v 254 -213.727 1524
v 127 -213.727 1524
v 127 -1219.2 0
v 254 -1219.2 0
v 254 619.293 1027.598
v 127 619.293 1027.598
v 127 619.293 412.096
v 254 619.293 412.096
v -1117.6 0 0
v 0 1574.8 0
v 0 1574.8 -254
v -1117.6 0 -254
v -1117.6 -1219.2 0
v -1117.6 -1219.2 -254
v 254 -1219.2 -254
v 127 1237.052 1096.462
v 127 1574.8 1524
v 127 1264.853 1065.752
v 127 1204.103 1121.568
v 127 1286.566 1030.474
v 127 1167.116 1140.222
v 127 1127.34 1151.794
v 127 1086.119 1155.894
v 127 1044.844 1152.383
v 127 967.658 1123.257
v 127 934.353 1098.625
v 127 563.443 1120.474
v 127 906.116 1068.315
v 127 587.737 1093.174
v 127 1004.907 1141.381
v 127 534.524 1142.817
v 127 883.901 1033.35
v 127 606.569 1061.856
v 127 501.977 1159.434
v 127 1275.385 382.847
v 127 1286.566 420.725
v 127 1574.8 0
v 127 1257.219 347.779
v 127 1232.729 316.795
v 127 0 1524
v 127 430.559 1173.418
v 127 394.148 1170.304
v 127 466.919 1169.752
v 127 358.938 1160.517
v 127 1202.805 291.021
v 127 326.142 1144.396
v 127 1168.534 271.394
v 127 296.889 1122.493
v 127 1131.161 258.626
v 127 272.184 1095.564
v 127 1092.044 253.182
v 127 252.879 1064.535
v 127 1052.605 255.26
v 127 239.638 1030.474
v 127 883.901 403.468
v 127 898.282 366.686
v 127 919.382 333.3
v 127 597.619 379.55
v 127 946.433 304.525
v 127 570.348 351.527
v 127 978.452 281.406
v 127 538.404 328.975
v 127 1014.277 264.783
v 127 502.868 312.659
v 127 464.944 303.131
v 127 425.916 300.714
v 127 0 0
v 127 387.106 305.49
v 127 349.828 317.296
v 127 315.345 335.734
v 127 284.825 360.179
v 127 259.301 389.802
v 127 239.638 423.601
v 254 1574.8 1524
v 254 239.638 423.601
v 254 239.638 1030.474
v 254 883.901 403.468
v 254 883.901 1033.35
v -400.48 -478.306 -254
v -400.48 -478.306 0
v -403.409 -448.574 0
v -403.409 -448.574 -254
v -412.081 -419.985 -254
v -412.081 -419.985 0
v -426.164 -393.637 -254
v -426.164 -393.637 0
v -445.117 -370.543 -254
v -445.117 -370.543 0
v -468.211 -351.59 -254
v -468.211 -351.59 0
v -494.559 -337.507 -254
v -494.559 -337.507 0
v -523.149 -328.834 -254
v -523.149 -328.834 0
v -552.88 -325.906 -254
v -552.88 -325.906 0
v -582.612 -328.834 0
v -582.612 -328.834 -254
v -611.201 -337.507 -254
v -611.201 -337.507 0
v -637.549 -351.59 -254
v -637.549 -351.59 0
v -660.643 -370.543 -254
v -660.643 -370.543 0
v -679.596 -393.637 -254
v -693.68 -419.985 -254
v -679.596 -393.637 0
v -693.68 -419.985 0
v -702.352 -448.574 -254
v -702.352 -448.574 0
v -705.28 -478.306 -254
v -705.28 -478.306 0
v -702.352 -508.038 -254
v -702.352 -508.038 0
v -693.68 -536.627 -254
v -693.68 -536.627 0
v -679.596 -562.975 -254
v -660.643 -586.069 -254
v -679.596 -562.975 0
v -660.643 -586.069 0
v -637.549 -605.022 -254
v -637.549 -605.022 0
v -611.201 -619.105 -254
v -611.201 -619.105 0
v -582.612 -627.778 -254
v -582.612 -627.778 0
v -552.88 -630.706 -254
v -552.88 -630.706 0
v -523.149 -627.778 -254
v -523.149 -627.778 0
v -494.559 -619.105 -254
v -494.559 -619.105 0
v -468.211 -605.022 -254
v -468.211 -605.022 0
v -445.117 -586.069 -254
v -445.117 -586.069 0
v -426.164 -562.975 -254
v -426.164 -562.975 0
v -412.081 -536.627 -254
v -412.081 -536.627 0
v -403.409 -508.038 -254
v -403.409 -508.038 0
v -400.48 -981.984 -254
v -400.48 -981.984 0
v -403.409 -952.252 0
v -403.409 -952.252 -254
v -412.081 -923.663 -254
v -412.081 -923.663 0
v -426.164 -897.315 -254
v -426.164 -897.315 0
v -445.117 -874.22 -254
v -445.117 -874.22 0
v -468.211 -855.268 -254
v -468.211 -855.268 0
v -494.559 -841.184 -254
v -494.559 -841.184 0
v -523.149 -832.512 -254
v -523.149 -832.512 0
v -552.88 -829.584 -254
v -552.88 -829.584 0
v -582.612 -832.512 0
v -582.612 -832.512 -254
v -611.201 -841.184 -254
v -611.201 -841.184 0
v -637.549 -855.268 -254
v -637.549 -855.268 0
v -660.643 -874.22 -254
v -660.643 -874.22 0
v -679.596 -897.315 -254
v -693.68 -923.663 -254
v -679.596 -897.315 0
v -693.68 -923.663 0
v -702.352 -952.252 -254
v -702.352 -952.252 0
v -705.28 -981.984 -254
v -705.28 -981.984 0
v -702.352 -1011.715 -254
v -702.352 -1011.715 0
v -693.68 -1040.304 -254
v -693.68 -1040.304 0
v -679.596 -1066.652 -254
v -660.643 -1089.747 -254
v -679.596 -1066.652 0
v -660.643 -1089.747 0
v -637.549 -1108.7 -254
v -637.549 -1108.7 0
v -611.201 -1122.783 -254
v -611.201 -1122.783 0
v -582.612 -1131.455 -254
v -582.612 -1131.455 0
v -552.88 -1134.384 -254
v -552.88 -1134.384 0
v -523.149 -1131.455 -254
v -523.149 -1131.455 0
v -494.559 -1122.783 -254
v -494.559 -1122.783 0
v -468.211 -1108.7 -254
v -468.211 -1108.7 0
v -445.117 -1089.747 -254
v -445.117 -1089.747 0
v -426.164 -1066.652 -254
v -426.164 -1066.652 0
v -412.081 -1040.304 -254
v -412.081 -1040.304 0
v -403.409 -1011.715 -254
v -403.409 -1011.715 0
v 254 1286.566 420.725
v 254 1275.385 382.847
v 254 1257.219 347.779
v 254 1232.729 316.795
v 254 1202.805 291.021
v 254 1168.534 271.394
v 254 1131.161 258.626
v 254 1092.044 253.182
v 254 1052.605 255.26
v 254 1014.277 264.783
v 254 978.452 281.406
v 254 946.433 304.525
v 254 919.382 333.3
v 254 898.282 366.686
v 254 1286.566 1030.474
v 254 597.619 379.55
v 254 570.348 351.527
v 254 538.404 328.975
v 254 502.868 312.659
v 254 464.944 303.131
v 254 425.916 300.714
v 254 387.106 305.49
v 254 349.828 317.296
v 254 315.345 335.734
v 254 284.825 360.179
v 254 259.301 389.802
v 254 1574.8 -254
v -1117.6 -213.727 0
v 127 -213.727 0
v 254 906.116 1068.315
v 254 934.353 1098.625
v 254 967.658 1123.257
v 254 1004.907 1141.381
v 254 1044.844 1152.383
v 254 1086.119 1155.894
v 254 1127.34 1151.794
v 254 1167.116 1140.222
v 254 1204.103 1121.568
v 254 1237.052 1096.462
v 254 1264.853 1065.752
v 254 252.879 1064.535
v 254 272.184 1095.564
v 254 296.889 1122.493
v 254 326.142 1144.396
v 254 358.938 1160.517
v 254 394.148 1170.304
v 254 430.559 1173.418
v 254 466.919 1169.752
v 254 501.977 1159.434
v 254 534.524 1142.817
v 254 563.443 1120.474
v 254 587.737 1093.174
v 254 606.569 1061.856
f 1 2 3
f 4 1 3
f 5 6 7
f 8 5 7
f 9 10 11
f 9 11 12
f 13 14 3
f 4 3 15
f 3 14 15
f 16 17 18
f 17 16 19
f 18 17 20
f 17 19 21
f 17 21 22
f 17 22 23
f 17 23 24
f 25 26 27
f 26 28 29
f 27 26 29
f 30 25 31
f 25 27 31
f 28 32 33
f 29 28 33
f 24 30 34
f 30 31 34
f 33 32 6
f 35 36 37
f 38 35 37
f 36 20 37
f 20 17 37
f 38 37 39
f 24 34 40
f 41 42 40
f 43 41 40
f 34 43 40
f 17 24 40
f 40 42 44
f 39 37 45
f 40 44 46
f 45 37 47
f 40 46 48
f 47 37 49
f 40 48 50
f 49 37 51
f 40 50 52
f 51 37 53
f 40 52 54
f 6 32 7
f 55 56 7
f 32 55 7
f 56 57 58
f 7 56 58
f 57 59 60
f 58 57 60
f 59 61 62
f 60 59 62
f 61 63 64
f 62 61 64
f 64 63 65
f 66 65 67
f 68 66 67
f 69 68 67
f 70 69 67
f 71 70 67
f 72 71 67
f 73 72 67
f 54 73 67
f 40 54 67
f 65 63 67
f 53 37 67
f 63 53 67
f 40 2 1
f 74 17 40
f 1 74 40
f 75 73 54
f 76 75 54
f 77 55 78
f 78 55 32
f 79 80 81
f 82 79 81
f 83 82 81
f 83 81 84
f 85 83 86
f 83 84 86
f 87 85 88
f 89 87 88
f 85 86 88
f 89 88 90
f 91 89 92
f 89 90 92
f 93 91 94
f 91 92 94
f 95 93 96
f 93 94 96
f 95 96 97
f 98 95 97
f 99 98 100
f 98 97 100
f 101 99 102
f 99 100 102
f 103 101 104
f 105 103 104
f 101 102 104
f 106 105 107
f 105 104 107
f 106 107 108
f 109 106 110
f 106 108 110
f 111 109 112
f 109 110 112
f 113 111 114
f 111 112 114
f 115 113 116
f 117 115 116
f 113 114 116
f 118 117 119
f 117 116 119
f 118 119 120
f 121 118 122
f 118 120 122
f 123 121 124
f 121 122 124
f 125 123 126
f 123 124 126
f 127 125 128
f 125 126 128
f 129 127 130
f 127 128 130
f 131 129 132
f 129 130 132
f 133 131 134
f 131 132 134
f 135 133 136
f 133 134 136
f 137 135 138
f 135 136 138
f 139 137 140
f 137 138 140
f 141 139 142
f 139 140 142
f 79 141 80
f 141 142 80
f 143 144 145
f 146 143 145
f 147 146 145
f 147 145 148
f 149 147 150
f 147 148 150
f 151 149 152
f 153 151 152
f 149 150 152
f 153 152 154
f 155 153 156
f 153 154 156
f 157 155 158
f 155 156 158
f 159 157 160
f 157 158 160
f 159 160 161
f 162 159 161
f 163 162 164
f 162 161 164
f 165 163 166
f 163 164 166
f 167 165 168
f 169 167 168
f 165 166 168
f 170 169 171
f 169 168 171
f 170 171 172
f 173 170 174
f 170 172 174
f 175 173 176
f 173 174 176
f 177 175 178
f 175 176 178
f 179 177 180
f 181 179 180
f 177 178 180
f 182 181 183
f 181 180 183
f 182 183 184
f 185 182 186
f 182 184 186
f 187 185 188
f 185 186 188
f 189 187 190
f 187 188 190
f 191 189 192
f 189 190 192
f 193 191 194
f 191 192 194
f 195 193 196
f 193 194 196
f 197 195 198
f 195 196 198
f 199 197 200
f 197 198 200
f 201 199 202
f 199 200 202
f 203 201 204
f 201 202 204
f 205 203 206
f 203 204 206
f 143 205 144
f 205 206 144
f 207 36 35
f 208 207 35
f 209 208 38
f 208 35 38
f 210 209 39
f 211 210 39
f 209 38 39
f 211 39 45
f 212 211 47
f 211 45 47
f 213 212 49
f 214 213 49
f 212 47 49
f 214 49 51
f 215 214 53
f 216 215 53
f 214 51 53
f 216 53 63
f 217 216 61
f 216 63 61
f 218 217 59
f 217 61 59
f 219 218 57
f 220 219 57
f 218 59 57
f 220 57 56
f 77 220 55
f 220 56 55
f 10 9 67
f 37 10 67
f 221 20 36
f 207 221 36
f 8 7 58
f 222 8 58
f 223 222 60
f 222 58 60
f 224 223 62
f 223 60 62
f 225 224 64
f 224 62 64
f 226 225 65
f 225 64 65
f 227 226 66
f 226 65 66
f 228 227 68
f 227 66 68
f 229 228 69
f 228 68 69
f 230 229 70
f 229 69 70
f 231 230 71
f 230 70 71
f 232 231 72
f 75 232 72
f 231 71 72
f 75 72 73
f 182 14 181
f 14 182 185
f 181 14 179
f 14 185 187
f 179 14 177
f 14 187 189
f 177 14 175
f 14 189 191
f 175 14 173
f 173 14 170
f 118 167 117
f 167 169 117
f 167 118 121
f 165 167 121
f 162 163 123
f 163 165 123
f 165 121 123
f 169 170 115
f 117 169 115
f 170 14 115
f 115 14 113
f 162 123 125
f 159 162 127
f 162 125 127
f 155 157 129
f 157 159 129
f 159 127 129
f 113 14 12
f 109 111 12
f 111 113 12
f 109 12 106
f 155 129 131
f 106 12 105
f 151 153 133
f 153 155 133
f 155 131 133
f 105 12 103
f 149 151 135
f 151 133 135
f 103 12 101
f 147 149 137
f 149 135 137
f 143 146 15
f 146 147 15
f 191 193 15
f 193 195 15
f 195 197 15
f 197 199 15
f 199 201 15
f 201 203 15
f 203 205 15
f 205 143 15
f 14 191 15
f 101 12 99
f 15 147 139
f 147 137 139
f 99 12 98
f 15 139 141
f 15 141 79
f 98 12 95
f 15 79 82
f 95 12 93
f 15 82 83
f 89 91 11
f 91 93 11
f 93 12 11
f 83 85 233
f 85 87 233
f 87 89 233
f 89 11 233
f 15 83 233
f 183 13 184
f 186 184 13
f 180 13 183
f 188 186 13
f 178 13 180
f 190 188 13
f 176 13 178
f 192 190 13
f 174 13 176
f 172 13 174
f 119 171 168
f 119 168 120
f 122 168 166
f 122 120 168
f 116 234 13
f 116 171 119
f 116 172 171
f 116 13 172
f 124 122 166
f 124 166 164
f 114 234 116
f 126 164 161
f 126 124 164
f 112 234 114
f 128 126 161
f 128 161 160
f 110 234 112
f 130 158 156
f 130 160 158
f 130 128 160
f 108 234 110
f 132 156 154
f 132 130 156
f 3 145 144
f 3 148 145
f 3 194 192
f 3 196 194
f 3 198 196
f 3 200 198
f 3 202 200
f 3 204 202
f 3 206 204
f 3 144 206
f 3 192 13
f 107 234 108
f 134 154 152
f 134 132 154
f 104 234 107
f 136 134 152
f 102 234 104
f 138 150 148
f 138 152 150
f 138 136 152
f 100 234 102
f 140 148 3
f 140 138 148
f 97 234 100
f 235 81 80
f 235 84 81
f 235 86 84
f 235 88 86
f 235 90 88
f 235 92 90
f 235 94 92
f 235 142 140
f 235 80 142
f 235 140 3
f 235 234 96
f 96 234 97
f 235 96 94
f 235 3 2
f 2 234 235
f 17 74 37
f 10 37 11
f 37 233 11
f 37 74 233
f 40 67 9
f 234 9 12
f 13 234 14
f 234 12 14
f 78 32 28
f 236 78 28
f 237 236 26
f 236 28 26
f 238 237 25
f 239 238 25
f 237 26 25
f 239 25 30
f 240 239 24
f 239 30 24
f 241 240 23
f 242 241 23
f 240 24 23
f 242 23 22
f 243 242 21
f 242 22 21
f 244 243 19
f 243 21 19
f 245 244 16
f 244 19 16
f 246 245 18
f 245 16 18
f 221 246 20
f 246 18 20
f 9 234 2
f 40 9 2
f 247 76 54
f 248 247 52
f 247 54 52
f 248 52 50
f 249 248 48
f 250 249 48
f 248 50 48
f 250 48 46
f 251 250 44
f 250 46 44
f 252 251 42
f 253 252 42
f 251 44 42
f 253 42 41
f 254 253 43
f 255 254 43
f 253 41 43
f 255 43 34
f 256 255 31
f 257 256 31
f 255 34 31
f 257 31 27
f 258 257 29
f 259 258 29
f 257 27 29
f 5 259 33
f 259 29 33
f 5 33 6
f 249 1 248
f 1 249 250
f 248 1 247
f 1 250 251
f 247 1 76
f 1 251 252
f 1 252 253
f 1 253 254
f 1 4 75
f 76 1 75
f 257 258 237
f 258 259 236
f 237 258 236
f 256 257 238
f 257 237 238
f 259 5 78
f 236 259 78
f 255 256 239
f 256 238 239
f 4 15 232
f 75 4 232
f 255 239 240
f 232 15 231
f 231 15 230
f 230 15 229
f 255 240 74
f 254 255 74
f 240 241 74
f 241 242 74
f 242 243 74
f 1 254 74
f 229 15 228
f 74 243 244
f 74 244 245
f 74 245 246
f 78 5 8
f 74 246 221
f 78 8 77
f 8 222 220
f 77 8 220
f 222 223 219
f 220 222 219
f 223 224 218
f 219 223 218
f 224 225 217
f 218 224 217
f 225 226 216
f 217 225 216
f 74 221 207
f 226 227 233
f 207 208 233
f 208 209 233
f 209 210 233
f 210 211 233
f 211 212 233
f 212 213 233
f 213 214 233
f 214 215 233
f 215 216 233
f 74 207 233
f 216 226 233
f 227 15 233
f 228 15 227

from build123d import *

# Parameters (mm, degrees)
F0_R     = 152.4
F1_DEPTH = 254
F2_W     = 127
F2_H     = 1005.4733751535
F3_DEPTH = 1524
F6_DEPTH = 254
F8_DEPTH = 254
F9_DEPTH = 254


with BuildPart() as f1:
    # F0 (on Top) → F1 (new body)
    with BuildSketch(Plane.XY):
        Polygon((254, -1219.2), (254, 1574.8), (0, 1574.8), (-1117.6, 0), (-1117.6, -1219.2), align=None)
        with Locations((-552.8803467751, -981.9835424423)):
            Circle(F0_R, mode=Mode.SUBTRACT)
        with Locations((-552.8803467751, -478.3061146736)):
            Circle(F0_R, mode=Mode.SUBTRACT)
    extrude(amount=-F1_DEPTH)

    # F2 (on face) → F3 (join)
    with BuildSketch(Plane.XY):
        Polygon((127, 0), (-1117.6, 0), (-1117.6, -213.7266248465), (-431.8, -213.7266248465), (127, -213.7266248465), align=None)
        with Locations((190.5, -716.4633124232)):
            Rectangle(F2_W, F2_H)
        Polygon((127, 1574.8), (127, 0), (127, -213.7266248465), (254, -213.7266248465), (254, 0), (254, 1574.8), align=None)
    extrude(amount=F3_DEPTH)

    # F5 (on face) → F6 (cut)
    with BuildSketch(Plane(origin=(127, 0, 0), x_dir=(0, -1, 0), z_dir=(-1, 0, 0))):
        Polygon((1219.2, 1524), (213.7266248465, 1524), (1219.2, 0), align=None)
    extrude(amount=-F6_DEPTH, mode=Mode.SUBTRACT)

    # F7 (on face) → F8 (cut)
    with BuildSketch(Plane.XZ.offset(213.7266248465)):
        Polygon((-1117.6, 0), (127, 1524), (-1117.6, 1524), align=None)
    extrude(amount=-F8_DEPTH, mode=Mode.SUBTRACT)

    # F4 (on face) → F9 (cut)
    with BuildSketch(Plane(origin=(127, 0, 0), x_dir=(0, -1, 0), z_dir=(-1, 0, 0))):
        with BuildLine():
            Line((-883.9013576508, 403.4678339958), (-883.9013576508, 1033.3504676819))
            ThreePointArc((-883.9013576508, 1033.3504676819), (-1086.1192680246, 1155.8941275066), (-1286.5660190582, 1030.4743051529))
            Line((-1286.5660190582, 1030.4743051529), (-1286.5660190582, 420.7248687744))
            ThreePointArc((-1286.5660190582, 420.7248687744), (-1092.044288841, 253.1821361636), (-883.9013576508, 403.4678339958))
        make_face()
        with BuildLine():
            Line((-239.6377772093, 423.6010611057), (-239.6377772093, 1030.4743051529))
            ThreePointArc((-239.6377772093, 1030.4743051529), (-430.5592294957, 1173.4177468945), (-619.2930936813, 1027.5981426239))
            Line((-619.2930936813, 1027.5981426239), (-619.2930936813, 412.0963513851))
            ThreePointArc((-619.2930936813, 412.0963513851), (-425.9158985225, 300.7140199759), (-239.6377772093, 423.6010611057))
        make_face()
    extrude(amount=-F9_DEPTH, mode=Mode.SUBTRACT)


solid = f1.part
